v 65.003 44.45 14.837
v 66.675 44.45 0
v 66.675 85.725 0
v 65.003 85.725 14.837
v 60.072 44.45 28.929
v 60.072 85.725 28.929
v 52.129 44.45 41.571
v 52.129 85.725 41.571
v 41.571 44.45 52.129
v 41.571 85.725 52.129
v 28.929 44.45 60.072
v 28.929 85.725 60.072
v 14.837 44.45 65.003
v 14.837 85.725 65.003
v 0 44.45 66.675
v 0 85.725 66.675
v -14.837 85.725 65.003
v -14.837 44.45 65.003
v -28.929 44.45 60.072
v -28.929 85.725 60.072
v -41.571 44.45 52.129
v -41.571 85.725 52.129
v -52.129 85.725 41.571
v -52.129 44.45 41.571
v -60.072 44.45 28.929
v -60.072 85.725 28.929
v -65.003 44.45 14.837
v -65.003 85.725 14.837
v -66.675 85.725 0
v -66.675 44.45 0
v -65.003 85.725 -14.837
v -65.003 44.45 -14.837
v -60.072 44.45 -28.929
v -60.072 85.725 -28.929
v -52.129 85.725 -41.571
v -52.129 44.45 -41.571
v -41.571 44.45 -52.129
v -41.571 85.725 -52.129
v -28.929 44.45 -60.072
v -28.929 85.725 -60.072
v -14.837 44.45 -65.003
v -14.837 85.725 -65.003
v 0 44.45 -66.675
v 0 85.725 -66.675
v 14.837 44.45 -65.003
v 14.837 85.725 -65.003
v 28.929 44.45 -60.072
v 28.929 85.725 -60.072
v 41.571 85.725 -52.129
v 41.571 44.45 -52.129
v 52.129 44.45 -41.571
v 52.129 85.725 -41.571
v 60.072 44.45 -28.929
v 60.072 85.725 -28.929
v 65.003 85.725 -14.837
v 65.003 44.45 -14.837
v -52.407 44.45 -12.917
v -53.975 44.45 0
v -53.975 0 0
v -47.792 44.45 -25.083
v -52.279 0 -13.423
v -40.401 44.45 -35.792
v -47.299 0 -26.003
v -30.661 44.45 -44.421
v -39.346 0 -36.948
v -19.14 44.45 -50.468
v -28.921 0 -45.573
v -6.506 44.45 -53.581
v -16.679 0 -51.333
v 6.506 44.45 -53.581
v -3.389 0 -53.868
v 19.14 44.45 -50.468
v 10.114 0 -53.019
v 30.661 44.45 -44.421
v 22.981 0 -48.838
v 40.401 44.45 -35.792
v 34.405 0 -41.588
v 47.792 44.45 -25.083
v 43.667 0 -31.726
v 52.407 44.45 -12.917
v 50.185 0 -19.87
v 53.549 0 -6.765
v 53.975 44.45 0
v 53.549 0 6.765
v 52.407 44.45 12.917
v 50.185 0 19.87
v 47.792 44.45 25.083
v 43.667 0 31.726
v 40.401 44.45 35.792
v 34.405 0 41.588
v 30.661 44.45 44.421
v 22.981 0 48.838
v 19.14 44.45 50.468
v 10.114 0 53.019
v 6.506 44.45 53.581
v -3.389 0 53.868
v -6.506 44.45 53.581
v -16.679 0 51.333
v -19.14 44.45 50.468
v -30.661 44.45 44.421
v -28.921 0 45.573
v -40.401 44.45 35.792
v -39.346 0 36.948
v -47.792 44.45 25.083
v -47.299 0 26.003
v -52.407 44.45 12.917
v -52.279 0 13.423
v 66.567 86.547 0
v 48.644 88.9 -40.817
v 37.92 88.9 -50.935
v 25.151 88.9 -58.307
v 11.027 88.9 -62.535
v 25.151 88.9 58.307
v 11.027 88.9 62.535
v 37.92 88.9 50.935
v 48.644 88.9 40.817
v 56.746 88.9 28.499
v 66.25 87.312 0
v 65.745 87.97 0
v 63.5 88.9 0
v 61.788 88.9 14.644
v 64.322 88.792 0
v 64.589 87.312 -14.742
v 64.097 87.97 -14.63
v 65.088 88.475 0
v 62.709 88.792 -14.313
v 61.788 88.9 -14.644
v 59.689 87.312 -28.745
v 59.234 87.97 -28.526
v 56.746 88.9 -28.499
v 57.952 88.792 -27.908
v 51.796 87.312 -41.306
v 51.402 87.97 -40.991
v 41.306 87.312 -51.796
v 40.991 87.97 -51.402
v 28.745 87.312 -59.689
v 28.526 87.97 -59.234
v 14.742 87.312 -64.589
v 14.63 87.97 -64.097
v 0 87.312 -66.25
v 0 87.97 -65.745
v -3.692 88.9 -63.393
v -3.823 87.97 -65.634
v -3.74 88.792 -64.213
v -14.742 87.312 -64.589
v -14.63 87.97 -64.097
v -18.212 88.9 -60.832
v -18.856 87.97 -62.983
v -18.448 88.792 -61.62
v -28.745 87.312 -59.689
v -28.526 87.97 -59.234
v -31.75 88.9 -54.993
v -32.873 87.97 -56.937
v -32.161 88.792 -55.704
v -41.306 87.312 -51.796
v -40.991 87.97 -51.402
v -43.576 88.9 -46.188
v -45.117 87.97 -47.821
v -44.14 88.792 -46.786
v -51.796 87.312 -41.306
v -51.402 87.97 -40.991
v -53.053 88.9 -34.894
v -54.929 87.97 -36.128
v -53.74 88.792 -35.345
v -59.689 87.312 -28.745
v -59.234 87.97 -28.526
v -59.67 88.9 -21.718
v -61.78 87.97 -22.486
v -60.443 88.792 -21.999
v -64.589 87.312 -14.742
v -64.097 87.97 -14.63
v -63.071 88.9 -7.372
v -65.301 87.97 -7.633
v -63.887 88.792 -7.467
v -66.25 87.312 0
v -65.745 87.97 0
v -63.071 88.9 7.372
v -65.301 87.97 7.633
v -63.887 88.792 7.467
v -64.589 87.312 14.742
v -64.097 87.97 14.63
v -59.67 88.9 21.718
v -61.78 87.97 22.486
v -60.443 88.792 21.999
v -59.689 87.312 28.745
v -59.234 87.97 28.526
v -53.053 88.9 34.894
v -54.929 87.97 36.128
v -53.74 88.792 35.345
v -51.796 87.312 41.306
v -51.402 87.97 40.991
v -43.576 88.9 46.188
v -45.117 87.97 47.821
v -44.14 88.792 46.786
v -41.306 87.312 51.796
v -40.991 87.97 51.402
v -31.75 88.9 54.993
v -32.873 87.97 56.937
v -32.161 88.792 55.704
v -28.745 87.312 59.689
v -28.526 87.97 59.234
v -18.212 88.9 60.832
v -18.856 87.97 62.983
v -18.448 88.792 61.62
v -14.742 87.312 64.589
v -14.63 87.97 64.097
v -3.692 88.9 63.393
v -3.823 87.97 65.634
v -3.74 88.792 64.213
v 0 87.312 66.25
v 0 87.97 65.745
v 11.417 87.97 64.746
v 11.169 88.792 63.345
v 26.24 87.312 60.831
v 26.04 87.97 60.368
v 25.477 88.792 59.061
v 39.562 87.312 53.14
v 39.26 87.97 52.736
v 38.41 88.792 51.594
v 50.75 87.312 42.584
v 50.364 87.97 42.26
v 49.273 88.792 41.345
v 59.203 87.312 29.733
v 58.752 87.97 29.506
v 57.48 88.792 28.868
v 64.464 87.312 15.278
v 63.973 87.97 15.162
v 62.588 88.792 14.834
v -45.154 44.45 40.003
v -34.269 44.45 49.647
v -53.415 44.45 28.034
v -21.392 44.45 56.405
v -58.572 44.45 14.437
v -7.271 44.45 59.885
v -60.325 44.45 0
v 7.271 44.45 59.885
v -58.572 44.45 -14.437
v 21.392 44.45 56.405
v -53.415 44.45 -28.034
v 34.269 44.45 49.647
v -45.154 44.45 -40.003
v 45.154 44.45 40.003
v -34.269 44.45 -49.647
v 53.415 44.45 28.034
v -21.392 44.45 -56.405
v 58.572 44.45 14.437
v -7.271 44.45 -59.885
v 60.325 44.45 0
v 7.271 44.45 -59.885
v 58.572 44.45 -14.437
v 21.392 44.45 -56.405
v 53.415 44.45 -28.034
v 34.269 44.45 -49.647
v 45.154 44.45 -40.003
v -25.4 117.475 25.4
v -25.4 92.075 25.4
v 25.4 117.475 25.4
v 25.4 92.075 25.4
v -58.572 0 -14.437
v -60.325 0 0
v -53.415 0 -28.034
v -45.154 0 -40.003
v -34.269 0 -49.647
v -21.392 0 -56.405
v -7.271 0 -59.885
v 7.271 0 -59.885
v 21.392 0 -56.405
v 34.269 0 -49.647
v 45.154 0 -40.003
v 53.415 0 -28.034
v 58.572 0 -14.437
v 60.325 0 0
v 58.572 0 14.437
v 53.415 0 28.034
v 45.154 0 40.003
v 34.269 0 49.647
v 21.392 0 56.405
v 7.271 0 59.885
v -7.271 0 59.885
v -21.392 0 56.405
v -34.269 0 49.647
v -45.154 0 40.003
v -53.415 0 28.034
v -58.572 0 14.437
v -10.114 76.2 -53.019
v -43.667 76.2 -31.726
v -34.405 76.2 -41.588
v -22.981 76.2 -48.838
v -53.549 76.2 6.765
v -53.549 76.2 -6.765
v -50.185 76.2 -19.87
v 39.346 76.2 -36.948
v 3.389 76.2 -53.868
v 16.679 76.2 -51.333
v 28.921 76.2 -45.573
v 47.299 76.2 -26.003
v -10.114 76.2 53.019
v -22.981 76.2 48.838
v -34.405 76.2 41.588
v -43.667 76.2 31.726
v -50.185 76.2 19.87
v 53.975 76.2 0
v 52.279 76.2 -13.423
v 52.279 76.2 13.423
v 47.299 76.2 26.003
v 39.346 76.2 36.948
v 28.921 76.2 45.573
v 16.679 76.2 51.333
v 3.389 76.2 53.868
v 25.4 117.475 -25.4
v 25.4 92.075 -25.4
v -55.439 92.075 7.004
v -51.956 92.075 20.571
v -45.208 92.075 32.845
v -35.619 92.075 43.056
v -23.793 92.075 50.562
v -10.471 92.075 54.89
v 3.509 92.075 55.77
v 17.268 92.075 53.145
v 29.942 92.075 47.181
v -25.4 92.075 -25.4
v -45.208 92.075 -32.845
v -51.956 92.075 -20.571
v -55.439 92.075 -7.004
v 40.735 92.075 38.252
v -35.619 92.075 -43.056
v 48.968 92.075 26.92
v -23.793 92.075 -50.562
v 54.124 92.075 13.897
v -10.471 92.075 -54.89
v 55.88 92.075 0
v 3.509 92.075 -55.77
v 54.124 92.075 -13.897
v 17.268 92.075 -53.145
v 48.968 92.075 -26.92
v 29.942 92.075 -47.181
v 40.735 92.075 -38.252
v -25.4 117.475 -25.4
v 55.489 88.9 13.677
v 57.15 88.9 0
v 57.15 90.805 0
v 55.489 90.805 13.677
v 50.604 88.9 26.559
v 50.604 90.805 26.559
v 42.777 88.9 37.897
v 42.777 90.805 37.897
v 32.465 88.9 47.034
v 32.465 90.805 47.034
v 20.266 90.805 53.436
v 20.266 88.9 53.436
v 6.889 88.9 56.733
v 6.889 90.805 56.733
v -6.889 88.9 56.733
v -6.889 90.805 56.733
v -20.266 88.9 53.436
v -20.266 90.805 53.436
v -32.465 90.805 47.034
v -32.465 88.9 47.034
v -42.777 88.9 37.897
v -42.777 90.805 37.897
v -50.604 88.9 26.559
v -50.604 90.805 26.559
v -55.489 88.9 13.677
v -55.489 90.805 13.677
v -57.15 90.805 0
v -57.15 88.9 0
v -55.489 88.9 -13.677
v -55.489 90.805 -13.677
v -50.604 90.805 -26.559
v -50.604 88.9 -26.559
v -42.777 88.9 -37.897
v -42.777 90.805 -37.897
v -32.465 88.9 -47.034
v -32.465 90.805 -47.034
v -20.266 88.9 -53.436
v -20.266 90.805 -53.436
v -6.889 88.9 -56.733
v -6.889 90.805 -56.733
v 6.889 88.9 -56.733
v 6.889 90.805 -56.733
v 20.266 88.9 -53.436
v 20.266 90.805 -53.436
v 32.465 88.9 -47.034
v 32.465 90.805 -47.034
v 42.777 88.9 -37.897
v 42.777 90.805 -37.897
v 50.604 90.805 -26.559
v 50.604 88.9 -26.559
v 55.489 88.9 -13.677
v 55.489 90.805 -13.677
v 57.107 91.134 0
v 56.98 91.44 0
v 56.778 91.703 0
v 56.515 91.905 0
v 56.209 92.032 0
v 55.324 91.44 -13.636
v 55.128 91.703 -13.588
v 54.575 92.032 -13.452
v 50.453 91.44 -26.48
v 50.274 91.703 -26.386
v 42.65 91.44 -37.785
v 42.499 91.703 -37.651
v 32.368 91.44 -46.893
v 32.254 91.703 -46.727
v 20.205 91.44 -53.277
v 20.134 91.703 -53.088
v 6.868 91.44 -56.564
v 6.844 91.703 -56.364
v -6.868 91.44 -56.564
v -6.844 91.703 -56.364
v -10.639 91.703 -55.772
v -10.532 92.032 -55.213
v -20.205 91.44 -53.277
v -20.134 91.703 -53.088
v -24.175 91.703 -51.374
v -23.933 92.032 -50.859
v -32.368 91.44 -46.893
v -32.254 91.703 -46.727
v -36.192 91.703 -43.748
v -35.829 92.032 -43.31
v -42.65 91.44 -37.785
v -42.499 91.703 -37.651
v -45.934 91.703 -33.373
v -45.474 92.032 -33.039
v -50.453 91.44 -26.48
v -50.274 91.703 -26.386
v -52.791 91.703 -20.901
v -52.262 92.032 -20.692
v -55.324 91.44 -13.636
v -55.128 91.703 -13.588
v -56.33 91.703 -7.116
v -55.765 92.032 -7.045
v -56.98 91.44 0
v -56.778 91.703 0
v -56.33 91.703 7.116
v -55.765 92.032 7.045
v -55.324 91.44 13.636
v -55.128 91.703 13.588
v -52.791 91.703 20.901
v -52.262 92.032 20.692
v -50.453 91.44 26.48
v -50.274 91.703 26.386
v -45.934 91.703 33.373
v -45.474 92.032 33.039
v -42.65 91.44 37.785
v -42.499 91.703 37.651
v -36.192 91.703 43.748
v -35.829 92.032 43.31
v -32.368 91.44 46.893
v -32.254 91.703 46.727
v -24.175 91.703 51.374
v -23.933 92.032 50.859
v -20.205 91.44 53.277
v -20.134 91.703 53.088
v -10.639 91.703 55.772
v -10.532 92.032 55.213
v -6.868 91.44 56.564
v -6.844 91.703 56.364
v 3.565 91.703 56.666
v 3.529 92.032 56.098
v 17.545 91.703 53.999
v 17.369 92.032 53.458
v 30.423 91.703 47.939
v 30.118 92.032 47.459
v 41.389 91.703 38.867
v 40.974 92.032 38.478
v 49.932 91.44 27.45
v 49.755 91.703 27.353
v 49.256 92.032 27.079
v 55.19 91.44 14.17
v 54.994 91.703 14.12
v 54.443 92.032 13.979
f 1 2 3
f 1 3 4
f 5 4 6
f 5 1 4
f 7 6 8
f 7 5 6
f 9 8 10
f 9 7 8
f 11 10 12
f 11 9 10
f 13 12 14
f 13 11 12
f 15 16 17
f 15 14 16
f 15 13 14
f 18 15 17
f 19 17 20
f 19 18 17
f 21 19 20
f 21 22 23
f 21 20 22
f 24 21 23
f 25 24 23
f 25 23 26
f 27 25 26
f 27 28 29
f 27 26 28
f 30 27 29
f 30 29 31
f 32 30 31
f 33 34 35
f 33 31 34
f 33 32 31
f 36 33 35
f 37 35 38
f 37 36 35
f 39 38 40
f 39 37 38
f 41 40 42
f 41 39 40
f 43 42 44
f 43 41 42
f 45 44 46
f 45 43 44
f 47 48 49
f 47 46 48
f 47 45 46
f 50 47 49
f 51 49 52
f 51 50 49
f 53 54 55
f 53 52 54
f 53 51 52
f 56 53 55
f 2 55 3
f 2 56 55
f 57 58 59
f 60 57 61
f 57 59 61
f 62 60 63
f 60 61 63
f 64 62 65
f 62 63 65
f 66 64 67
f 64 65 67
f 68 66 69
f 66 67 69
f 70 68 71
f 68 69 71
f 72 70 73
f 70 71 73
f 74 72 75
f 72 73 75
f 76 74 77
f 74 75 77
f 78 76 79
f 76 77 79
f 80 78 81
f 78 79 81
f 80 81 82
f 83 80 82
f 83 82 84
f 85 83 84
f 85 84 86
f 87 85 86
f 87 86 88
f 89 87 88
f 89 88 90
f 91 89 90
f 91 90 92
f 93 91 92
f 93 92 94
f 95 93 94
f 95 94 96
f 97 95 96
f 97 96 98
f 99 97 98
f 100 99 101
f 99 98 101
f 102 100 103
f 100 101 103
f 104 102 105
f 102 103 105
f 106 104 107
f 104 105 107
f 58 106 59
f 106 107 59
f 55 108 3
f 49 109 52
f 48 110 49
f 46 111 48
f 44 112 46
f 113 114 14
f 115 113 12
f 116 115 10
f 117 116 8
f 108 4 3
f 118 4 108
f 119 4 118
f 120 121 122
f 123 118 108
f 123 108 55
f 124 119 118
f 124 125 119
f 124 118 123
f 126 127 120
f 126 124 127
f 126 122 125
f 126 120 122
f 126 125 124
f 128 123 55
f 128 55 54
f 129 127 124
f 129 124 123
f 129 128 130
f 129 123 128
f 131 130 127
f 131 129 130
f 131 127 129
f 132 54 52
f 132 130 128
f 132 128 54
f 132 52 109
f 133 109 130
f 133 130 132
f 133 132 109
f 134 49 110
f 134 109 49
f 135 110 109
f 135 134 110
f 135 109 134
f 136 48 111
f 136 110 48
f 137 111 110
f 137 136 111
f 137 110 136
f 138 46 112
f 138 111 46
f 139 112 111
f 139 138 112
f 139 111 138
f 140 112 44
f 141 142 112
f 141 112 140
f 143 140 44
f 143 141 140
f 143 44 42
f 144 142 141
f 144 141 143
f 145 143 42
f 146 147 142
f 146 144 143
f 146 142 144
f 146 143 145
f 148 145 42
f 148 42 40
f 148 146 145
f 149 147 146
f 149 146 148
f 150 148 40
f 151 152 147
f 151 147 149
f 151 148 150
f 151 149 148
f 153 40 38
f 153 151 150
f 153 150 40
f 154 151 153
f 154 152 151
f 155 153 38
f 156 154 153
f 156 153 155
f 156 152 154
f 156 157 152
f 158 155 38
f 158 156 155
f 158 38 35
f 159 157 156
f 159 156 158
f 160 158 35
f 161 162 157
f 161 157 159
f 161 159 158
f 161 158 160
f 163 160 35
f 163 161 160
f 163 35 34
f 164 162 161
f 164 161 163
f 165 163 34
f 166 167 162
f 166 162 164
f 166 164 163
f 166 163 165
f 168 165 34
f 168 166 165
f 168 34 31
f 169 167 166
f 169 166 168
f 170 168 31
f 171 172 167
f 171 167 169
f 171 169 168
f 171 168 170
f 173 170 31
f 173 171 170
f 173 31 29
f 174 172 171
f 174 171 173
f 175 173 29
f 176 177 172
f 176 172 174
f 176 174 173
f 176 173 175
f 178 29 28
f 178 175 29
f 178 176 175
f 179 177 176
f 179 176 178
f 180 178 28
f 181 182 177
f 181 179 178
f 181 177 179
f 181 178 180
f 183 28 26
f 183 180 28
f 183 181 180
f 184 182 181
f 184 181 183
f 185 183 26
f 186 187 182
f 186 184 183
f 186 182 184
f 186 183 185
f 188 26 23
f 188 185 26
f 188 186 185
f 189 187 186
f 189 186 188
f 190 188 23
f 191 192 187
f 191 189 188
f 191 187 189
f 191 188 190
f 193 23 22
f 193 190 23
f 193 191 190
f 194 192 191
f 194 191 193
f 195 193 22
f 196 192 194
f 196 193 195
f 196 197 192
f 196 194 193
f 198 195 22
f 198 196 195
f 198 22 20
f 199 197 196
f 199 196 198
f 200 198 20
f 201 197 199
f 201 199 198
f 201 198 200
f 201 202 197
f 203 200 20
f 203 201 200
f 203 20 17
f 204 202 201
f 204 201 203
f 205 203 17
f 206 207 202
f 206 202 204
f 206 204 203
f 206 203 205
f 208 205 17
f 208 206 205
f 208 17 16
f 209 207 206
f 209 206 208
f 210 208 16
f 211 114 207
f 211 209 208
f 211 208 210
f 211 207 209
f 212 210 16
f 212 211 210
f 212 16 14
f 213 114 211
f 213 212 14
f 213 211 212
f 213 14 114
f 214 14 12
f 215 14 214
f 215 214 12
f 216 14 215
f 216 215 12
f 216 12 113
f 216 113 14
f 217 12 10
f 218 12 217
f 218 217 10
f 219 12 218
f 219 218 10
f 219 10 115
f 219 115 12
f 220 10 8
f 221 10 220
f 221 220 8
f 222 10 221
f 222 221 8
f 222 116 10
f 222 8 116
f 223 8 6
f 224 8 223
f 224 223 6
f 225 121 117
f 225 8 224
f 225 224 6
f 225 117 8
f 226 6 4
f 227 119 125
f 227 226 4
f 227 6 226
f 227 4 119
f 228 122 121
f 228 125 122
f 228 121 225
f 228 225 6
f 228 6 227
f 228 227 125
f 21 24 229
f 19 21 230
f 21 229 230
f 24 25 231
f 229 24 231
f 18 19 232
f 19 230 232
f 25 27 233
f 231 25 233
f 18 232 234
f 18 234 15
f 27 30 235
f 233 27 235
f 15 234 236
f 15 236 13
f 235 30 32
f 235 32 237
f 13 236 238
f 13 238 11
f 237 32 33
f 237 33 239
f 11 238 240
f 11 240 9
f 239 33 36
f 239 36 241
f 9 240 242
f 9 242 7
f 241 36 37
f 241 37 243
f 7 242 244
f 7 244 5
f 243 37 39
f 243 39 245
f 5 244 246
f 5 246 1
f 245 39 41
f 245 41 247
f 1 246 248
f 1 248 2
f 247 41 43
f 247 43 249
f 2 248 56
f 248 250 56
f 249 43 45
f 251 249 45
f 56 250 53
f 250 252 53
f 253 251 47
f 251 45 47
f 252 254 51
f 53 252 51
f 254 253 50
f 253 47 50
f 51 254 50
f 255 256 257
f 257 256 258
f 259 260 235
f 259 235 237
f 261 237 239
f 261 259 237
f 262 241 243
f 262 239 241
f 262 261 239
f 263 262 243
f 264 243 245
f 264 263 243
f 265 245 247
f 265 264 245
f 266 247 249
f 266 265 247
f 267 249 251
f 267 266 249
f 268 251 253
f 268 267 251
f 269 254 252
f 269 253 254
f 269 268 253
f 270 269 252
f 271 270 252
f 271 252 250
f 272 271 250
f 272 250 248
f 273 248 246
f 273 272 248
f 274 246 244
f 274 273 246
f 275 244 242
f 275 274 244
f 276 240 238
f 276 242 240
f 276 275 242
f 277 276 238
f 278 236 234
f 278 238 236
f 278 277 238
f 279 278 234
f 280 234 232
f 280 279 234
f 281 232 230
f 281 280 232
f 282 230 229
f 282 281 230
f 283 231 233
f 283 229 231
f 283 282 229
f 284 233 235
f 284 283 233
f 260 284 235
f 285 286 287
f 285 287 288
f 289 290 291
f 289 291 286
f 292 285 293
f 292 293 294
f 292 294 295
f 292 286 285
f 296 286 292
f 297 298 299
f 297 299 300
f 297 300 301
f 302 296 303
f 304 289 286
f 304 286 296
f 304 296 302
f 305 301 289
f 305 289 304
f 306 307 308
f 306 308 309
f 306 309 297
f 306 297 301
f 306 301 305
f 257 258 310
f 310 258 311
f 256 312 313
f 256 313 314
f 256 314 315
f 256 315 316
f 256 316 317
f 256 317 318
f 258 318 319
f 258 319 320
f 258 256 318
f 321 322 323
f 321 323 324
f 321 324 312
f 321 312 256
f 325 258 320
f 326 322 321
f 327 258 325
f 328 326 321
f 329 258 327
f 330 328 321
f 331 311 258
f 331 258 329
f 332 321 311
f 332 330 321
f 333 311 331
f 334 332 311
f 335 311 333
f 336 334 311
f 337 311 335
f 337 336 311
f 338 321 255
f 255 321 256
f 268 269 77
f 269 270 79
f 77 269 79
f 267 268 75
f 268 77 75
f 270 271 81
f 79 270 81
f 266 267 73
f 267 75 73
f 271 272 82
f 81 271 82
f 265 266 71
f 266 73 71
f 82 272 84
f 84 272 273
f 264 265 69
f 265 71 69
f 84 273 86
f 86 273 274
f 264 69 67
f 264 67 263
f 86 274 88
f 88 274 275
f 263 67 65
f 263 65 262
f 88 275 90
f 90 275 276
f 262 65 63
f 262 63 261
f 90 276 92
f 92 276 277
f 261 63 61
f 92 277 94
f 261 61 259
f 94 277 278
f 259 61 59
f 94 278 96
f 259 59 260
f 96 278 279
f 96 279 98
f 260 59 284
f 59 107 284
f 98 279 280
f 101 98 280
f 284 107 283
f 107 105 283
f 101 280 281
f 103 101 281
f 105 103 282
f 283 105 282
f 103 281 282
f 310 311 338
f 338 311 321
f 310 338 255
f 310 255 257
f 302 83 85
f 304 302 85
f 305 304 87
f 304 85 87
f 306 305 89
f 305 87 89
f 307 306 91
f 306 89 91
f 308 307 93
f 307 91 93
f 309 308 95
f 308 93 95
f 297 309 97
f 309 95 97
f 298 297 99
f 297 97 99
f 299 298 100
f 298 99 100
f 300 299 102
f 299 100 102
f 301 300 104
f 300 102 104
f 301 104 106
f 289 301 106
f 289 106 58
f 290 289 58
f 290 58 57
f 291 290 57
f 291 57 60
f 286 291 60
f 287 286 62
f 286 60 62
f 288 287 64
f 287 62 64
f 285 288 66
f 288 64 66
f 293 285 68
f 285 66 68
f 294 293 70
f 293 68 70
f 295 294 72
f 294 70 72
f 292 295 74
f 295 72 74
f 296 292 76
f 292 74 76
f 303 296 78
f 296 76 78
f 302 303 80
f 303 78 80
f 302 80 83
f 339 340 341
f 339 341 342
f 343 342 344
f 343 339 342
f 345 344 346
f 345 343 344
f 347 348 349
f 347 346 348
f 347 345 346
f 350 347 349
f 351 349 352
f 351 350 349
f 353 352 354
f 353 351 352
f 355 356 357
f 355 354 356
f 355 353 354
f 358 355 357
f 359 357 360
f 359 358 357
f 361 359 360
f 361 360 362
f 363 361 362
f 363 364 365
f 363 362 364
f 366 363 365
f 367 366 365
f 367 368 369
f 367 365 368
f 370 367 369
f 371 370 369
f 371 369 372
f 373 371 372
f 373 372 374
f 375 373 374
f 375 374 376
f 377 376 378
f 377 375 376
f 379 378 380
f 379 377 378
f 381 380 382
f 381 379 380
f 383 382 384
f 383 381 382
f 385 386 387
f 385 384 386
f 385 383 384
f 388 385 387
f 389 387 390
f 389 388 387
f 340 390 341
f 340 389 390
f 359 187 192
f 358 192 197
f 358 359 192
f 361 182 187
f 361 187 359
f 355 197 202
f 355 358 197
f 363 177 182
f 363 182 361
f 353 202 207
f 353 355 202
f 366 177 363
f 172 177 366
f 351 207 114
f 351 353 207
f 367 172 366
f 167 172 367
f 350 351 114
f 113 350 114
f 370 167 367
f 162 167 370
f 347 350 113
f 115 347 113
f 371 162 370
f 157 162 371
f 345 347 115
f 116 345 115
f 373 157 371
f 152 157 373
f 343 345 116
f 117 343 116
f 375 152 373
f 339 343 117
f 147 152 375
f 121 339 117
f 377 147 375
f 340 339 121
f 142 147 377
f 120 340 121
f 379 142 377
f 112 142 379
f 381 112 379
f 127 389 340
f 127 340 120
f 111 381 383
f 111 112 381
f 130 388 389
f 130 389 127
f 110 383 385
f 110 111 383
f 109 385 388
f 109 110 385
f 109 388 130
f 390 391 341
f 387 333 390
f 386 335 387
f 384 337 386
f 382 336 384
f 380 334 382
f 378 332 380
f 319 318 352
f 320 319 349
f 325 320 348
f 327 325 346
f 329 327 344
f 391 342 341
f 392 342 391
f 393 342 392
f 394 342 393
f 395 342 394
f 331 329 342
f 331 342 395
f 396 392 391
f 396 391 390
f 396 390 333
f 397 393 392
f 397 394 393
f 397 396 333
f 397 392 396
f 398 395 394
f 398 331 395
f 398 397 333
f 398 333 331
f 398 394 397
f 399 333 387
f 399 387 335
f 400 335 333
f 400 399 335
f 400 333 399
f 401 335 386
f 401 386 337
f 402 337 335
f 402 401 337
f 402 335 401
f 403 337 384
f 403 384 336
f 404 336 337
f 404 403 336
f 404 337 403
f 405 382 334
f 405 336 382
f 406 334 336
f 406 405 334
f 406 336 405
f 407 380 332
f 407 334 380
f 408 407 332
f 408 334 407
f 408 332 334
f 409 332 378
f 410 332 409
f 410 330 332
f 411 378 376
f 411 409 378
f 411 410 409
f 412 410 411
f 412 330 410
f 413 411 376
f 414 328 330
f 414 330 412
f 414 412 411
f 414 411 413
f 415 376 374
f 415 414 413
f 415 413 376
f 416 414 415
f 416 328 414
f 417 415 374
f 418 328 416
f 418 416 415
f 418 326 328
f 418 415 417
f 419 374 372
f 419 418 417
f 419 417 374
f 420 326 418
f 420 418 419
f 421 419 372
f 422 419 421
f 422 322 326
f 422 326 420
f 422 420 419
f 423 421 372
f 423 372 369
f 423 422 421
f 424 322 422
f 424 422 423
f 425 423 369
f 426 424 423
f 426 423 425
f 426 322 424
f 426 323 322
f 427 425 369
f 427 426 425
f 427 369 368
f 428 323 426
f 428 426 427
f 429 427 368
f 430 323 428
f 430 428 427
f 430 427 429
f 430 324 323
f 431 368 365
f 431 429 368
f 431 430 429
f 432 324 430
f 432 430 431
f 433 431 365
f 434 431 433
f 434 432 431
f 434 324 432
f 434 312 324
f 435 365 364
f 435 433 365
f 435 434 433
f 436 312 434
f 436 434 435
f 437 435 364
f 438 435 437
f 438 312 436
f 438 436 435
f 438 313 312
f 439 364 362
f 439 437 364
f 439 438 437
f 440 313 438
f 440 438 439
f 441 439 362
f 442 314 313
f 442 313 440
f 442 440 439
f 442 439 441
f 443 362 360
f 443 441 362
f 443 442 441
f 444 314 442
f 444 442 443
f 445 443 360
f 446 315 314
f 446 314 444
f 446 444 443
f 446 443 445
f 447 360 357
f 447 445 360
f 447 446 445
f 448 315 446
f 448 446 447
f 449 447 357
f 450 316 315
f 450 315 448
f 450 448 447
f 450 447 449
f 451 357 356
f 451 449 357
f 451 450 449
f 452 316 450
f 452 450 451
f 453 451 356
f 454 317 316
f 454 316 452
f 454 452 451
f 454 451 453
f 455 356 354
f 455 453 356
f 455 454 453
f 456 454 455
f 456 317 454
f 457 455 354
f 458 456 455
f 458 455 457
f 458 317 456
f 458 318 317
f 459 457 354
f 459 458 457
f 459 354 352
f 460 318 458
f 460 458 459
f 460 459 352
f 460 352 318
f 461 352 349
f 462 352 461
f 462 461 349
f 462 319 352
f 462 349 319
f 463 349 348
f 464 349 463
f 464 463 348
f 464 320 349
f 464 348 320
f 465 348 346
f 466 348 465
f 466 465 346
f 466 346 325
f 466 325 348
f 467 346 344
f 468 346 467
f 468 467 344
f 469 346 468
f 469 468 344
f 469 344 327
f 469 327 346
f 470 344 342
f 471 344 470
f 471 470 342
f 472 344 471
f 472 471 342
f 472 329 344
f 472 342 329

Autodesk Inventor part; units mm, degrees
ref_plane "YZ Plane" through (0, 0, 0) normal (1, 0, 0) x (0, 1, 0)
ref_plane "XZ Plane" through (0, 0, 0) normal (0, 1, 0) x (-1, 0, 0)
ref_plane "XY Plane" through (0, 0, 0) normal (0, 0, 1) x (1, 0, 0)
sketch "Sketch1" plane through (0, 0, 0) normal (0, 1, 0) x (-1, 0, 0)
  circle A0 centre (0, 0) radius 53.975
  circle A1 centre (0, 0) radius 60.325
  dimension "d0" = 107.95
  dimension "d1" = 120.65
extrude "Extrusion1" add sketch "Sketch1" along normal blind 44.45
sketch "Sketch2" plane through (0, 44.45, 0) normal (0, 1, 0) x (1, 0, 0)
  circle A0 centre (0, 0) radius 66.675
  dimension "d4" = 133.35
extrude "Extrusion2" add sketch "Sketch2" along normal blind 44.45
sketch "Sketch3" plane through (0, 44.45, 0) normal (0, -1, 0) x (1, 0, 0)
  circle A0 centre (0, 0) radius 53.975
  dimension "d7" = 107.95
extrude "Extrusion3" cut sketch "Sketch3" against normal blind 31.75
sketch "Sketch4" plane through (0, 88.9, 0) normal (0, 1, 0) x (1, 0, 0)
  circle A0 centre (0, 0) radius 57.15
  dimension "d10" = 114.3
extrude "Extrusion4" add sketch "Sketch4" along normal blind 3.175
sketch "Sketch5" plane through (0, 92.075, 0) normal (0, 1, 0) x (1, 0, 0)
  line L0 (-25.4, -25.4) -> (25.4, -25.4)
  line L1 (25.4, -25.4) -> (25.4, 25.4)
  line L2 (25.4, 25.4) -> (-25.4, 25.4)
  line L3 (-25.4, 25.4) -> (-25.4, -25.4)
  point P0 (0, 0)
  dimension "d13" = 50.8
  dimension "d14" = 50.8
extrude "Extrusion5" add sketch "Sketch5" along normal blind 25.4
fillet "Fillet1" radius 3.175 1 edges at (-66.675, 88.9, 0)
fillet "Fillet2" radius 1.27 1 edges at (-57.15, 92.075, 0)
properties part number "4in Cleanout Adapter w Plug"
